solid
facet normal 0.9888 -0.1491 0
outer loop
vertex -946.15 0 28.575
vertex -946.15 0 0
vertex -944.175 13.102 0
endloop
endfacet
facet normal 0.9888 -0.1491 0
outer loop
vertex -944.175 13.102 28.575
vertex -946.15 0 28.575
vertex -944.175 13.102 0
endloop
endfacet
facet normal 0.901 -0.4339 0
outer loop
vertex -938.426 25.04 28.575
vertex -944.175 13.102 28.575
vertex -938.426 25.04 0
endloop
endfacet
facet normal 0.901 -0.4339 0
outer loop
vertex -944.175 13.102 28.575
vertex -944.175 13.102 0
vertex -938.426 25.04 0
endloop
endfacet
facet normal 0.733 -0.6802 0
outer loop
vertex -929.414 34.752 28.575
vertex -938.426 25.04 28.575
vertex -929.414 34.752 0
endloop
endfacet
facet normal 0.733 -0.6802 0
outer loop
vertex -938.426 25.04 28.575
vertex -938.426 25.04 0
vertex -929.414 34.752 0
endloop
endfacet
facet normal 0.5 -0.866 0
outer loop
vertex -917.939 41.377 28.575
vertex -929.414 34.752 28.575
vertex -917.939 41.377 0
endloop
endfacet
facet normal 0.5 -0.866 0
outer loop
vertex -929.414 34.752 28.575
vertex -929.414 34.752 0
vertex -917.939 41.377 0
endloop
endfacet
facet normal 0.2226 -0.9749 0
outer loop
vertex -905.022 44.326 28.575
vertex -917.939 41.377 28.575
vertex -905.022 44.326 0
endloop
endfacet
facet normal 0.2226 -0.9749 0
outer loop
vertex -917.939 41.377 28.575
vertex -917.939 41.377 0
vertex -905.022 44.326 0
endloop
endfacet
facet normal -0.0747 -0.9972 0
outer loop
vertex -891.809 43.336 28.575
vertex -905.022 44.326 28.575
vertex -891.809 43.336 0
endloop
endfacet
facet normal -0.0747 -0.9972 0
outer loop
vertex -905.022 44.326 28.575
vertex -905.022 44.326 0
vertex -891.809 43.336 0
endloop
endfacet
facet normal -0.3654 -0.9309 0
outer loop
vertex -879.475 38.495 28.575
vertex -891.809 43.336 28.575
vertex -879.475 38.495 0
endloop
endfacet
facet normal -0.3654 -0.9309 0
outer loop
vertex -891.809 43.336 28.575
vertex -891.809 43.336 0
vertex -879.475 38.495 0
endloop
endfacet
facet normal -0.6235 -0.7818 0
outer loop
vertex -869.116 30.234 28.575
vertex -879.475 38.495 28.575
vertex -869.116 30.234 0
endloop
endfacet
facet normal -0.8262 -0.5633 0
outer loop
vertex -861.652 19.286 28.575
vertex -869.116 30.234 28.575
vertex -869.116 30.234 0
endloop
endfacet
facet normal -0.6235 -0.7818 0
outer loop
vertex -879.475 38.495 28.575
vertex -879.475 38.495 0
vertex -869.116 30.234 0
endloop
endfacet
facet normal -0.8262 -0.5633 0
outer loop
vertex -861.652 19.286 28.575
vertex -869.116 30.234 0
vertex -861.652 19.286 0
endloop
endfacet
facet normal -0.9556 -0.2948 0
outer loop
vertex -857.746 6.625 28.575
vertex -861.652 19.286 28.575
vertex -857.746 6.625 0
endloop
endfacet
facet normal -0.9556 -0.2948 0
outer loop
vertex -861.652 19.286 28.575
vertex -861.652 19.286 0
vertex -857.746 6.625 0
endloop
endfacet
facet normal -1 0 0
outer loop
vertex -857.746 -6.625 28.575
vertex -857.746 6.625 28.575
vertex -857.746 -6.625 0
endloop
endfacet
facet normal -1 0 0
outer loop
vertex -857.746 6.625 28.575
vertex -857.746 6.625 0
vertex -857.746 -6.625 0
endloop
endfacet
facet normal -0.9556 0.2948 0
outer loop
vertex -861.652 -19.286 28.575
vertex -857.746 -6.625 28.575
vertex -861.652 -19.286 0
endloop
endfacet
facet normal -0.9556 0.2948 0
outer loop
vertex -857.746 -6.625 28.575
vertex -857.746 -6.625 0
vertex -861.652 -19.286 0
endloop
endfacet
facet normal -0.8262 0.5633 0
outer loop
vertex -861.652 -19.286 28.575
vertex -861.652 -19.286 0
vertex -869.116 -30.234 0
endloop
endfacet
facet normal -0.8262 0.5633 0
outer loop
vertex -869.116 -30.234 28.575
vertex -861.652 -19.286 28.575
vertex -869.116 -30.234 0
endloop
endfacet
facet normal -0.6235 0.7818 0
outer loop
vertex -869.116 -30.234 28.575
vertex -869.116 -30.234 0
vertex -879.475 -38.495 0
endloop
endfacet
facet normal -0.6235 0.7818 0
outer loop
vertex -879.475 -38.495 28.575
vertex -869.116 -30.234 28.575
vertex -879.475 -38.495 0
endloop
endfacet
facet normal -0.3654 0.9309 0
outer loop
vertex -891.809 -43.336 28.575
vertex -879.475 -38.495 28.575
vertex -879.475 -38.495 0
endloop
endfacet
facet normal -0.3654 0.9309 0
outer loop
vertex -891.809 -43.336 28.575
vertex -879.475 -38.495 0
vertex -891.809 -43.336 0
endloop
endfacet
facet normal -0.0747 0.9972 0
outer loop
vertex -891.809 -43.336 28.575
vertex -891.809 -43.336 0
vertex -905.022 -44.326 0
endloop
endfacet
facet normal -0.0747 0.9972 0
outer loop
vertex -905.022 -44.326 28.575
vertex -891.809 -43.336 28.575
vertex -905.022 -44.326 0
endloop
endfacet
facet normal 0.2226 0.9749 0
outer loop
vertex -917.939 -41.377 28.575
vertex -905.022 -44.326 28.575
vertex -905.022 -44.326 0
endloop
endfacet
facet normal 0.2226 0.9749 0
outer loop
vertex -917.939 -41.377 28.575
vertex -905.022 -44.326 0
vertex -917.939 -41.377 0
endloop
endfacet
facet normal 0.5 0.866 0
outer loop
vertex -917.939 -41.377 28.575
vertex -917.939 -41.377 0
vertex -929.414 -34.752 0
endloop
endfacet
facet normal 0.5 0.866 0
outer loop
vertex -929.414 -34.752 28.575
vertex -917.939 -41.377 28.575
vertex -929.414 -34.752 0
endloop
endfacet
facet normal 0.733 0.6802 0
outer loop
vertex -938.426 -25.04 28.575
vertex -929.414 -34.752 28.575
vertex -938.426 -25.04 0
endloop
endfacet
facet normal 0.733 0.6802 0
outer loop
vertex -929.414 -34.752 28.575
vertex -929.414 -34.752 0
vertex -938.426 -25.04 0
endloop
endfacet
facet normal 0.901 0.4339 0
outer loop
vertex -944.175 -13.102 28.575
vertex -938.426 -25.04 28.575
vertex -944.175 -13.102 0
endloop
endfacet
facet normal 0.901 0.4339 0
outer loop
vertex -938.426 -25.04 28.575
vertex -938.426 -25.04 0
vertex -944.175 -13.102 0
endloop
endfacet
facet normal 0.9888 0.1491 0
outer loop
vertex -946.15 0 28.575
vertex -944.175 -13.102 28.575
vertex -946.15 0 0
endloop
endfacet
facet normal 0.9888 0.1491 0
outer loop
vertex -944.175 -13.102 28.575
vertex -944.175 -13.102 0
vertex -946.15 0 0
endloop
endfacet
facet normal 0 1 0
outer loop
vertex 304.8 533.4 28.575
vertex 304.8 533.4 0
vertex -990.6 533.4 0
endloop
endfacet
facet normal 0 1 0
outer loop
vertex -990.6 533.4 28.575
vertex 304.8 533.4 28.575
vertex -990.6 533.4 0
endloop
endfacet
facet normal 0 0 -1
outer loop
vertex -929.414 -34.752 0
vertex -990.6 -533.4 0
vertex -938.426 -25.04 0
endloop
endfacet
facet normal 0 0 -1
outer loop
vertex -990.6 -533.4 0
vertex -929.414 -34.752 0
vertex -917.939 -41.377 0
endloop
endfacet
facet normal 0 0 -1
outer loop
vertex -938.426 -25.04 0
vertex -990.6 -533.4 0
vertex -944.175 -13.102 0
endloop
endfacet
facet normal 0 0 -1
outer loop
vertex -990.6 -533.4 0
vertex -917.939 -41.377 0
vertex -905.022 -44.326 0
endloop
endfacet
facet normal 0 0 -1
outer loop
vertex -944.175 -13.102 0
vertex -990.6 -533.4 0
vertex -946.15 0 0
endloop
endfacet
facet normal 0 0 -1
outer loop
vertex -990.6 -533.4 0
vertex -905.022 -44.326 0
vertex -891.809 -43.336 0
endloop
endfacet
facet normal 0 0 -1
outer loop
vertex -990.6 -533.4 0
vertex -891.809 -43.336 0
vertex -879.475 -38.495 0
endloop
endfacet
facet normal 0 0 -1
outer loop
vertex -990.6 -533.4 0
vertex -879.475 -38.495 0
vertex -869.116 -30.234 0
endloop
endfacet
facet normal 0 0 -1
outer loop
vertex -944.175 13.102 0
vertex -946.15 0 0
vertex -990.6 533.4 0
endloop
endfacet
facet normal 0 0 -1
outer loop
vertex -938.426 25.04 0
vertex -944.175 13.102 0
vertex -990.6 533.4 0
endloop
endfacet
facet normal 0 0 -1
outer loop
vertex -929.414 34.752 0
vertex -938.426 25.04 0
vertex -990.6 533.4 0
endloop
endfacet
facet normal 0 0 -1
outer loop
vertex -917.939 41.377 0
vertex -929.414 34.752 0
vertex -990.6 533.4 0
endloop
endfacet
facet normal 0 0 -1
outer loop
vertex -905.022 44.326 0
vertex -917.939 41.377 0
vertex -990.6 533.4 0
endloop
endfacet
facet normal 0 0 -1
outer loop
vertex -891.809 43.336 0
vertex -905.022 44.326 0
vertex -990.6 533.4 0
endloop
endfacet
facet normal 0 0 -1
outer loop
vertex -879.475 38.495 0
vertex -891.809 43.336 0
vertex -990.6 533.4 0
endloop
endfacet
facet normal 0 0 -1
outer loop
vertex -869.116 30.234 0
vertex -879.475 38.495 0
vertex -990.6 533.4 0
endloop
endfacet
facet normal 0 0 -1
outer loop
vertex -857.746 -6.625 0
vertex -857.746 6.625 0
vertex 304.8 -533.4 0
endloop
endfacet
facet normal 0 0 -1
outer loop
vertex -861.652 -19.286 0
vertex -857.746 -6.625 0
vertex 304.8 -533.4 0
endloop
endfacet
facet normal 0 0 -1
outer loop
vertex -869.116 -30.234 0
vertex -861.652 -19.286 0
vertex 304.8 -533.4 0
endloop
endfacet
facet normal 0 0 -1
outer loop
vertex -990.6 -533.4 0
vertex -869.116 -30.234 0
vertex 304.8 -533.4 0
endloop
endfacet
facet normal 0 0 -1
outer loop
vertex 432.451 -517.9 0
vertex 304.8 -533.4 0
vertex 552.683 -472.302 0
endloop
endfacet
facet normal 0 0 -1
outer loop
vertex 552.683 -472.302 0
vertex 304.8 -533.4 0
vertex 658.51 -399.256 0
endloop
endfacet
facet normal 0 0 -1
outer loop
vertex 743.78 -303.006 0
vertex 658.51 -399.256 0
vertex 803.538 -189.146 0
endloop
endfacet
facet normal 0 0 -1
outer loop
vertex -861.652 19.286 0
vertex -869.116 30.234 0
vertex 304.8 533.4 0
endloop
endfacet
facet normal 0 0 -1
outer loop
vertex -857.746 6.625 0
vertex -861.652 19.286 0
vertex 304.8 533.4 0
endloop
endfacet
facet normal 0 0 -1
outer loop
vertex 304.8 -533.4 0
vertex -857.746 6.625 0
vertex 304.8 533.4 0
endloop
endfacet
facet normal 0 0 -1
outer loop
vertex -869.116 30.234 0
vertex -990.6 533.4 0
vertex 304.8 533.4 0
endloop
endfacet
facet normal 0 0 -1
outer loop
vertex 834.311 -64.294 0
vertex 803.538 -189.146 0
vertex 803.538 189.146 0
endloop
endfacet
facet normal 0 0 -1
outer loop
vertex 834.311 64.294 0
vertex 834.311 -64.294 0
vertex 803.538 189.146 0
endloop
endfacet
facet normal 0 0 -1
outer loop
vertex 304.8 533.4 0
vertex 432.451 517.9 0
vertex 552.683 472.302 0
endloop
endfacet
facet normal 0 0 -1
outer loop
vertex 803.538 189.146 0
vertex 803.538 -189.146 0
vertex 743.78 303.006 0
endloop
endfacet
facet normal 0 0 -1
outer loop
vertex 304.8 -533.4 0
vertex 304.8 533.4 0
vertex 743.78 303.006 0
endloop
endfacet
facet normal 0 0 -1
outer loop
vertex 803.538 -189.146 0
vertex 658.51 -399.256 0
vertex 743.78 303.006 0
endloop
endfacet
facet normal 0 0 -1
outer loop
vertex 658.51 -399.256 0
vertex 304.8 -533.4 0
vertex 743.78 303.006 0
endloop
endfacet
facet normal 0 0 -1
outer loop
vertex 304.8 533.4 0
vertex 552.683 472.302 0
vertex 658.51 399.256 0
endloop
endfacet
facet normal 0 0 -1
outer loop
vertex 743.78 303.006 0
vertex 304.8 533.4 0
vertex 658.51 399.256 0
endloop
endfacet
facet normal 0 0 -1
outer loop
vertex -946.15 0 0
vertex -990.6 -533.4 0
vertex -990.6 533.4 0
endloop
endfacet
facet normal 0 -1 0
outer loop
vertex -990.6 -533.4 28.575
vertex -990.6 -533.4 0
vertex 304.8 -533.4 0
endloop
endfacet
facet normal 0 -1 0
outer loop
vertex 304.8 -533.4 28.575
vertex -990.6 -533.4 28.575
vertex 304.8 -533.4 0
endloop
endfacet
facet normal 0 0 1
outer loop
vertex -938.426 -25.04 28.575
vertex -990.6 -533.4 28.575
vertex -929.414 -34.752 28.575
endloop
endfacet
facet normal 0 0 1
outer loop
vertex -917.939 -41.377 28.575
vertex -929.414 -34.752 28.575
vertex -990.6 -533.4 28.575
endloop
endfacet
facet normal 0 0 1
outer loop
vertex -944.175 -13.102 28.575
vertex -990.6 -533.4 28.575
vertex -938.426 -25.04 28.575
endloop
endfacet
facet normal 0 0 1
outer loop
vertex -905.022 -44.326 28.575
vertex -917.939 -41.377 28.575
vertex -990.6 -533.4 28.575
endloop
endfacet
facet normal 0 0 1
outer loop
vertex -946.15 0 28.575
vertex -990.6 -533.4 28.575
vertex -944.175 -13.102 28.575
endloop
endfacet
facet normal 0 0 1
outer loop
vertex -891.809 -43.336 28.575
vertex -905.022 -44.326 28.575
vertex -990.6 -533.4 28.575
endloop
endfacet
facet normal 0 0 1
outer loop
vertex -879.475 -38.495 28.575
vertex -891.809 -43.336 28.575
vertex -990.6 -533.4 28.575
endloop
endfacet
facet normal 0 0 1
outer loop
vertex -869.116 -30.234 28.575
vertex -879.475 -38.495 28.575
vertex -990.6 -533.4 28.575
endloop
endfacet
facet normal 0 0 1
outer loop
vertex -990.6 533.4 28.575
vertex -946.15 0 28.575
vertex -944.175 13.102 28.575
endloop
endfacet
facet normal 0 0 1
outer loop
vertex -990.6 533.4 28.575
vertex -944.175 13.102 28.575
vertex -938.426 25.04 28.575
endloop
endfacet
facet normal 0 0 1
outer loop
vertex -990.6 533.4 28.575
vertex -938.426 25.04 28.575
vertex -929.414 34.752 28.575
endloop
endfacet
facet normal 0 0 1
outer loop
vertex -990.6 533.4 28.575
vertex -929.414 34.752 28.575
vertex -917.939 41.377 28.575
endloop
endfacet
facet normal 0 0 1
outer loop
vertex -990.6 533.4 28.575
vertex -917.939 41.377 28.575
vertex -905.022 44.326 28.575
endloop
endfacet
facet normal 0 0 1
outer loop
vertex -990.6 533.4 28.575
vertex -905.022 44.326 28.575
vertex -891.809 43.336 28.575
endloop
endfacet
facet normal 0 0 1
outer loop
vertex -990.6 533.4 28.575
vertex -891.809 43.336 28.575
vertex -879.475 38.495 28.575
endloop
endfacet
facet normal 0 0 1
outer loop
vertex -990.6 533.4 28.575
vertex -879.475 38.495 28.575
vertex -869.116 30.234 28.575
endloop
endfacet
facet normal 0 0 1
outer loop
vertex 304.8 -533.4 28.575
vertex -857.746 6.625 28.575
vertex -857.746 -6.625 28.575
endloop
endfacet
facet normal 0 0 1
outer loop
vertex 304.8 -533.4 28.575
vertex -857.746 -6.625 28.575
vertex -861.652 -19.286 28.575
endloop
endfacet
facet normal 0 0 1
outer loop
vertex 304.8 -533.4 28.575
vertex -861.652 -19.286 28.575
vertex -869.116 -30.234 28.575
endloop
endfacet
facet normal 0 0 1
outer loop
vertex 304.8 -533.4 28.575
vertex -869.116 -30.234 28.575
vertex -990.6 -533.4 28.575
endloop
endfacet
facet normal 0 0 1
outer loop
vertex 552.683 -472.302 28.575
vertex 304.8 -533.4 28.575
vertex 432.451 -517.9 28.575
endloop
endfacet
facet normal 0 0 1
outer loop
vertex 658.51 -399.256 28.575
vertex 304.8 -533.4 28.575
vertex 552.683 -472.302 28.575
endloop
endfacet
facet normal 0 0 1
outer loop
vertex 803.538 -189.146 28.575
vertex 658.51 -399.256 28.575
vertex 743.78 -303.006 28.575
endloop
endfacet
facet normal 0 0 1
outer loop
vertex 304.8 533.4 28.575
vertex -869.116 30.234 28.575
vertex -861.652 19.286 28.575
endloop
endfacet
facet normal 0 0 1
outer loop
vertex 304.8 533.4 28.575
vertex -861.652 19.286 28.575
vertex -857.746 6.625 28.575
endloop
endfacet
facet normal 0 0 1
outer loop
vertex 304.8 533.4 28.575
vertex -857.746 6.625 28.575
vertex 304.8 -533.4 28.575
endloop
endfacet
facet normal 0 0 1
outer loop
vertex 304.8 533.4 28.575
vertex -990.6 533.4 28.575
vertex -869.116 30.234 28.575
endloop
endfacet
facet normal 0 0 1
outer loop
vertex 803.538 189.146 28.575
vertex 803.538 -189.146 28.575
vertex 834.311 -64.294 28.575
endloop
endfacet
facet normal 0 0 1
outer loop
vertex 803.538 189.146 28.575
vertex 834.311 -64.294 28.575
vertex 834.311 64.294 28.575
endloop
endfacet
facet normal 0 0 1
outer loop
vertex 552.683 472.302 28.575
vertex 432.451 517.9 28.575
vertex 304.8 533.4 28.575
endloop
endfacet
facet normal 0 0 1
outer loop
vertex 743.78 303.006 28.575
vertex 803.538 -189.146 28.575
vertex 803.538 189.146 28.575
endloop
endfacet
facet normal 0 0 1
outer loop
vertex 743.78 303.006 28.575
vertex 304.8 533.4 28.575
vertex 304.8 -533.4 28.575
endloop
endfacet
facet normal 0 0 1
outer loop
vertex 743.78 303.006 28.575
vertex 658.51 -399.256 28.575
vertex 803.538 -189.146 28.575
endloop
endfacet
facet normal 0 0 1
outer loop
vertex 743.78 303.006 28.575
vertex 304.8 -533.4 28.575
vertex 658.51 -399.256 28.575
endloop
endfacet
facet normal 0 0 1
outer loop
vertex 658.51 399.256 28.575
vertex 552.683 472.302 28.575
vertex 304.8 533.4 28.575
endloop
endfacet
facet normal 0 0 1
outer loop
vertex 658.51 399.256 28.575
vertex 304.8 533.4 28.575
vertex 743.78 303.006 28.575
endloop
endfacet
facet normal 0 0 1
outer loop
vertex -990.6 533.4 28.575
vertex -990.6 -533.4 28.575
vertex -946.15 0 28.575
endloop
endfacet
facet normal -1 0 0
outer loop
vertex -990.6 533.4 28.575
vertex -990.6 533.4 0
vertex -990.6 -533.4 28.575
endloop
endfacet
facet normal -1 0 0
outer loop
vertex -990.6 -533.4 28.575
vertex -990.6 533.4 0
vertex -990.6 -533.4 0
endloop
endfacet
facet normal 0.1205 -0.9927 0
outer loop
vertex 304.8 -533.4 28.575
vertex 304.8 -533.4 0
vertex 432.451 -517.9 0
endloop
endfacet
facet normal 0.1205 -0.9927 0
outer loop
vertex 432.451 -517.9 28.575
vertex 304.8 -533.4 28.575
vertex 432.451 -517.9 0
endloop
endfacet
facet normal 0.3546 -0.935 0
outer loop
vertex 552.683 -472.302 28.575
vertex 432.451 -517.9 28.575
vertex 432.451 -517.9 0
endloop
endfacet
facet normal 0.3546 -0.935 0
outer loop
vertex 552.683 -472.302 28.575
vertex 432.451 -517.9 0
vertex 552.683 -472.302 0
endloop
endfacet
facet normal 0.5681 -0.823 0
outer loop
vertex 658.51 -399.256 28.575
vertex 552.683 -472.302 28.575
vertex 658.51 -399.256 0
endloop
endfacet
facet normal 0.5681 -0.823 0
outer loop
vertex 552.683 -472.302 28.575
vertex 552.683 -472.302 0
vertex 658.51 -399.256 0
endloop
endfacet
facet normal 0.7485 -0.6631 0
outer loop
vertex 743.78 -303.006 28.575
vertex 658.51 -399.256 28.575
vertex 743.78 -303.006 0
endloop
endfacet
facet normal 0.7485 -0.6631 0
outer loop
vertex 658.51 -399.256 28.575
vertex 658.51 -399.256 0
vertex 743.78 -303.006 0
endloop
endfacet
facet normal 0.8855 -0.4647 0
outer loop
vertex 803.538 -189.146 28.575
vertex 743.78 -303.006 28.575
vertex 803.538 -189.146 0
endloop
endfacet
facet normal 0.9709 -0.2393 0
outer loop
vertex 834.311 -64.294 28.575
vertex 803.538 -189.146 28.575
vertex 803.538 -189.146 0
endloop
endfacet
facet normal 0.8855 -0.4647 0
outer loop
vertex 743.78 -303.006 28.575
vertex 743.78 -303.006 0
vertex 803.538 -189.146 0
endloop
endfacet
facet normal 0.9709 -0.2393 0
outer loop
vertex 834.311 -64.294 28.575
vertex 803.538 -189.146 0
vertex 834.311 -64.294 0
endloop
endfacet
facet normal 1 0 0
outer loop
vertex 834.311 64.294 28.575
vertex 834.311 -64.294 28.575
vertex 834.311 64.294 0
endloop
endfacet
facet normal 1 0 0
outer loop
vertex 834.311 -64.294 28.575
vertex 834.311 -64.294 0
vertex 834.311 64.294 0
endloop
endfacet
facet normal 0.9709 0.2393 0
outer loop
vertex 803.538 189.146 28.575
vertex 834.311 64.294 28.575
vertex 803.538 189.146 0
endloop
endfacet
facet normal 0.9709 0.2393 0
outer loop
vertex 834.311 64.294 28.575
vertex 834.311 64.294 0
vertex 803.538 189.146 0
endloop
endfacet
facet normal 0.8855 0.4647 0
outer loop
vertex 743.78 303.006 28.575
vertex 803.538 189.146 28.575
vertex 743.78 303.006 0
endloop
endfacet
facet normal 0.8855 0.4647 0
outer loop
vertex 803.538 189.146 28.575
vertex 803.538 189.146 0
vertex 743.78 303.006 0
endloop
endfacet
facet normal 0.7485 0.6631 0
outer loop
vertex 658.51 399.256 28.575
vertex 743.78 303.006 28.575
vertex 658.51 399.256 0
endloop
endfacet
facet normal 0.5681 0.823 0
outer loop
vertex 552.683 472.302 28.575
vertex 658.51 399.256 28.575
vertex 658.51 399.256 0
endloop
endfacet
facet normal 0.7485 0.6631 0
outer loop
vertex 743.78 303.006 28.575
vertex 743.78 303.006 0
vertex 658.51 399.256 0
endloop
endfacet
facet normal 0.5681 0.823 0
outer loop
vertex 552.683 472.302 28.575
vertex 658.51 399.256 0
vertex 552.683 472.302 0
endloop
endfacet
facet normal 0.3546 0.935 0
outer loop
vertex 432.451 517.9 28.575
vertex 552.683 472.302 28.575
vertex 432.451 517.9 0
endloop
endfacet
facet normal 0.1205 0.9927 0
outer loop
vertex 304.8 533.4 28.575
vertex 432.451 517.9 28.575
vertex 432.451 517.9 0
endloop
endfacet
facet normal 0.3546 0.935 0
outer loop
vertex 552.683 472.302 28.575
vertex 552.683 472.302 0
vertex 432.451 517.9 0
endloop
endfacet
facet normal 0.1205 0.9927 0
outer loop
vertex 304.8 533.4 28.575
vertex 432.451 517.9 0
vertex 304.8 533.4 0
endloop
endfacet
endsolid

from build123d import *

# Parameters (mm, degrees)
F1_DEPTH = 28.575


# Not quite as in the source:
# - a feature names something its author has since deleted; it is built from what else it names


with BuildPart() as f1:
    # F0 (on Top) → F1 (new body)
    with BuildSketch(Plane.XY):
        with BuildLine():
            Line((304.8, 533.4), (-990.6, 533.4))
            Line((-990.6, 533.4), (-990.6, 0))
            Line((-990.6, 0), (-990.6, -533.4))
            Line((-990.6, -533.4), (304.8, -533.4))
            ThreePointArc((304.8, -533.4), (681.9707570849, -377.1707570849), (838.2, 0))
            ThreePointArc((838.2, 0), (681.9707570849, 377.1707570849), (304.8, 533.4))
        make_face()
        with BuildLine():
            ThreePointArc((-857.25, 0), (-901.7, -44.45), (-946.15, 0))
            ThreePointArc((-946.15, 0), (-901.7, 44.45), (-857.25, 0))
        make_face(mode=Mode.SUBTRACT)
    extrude(amount=F1_DEPTH)


solid = f1.part
